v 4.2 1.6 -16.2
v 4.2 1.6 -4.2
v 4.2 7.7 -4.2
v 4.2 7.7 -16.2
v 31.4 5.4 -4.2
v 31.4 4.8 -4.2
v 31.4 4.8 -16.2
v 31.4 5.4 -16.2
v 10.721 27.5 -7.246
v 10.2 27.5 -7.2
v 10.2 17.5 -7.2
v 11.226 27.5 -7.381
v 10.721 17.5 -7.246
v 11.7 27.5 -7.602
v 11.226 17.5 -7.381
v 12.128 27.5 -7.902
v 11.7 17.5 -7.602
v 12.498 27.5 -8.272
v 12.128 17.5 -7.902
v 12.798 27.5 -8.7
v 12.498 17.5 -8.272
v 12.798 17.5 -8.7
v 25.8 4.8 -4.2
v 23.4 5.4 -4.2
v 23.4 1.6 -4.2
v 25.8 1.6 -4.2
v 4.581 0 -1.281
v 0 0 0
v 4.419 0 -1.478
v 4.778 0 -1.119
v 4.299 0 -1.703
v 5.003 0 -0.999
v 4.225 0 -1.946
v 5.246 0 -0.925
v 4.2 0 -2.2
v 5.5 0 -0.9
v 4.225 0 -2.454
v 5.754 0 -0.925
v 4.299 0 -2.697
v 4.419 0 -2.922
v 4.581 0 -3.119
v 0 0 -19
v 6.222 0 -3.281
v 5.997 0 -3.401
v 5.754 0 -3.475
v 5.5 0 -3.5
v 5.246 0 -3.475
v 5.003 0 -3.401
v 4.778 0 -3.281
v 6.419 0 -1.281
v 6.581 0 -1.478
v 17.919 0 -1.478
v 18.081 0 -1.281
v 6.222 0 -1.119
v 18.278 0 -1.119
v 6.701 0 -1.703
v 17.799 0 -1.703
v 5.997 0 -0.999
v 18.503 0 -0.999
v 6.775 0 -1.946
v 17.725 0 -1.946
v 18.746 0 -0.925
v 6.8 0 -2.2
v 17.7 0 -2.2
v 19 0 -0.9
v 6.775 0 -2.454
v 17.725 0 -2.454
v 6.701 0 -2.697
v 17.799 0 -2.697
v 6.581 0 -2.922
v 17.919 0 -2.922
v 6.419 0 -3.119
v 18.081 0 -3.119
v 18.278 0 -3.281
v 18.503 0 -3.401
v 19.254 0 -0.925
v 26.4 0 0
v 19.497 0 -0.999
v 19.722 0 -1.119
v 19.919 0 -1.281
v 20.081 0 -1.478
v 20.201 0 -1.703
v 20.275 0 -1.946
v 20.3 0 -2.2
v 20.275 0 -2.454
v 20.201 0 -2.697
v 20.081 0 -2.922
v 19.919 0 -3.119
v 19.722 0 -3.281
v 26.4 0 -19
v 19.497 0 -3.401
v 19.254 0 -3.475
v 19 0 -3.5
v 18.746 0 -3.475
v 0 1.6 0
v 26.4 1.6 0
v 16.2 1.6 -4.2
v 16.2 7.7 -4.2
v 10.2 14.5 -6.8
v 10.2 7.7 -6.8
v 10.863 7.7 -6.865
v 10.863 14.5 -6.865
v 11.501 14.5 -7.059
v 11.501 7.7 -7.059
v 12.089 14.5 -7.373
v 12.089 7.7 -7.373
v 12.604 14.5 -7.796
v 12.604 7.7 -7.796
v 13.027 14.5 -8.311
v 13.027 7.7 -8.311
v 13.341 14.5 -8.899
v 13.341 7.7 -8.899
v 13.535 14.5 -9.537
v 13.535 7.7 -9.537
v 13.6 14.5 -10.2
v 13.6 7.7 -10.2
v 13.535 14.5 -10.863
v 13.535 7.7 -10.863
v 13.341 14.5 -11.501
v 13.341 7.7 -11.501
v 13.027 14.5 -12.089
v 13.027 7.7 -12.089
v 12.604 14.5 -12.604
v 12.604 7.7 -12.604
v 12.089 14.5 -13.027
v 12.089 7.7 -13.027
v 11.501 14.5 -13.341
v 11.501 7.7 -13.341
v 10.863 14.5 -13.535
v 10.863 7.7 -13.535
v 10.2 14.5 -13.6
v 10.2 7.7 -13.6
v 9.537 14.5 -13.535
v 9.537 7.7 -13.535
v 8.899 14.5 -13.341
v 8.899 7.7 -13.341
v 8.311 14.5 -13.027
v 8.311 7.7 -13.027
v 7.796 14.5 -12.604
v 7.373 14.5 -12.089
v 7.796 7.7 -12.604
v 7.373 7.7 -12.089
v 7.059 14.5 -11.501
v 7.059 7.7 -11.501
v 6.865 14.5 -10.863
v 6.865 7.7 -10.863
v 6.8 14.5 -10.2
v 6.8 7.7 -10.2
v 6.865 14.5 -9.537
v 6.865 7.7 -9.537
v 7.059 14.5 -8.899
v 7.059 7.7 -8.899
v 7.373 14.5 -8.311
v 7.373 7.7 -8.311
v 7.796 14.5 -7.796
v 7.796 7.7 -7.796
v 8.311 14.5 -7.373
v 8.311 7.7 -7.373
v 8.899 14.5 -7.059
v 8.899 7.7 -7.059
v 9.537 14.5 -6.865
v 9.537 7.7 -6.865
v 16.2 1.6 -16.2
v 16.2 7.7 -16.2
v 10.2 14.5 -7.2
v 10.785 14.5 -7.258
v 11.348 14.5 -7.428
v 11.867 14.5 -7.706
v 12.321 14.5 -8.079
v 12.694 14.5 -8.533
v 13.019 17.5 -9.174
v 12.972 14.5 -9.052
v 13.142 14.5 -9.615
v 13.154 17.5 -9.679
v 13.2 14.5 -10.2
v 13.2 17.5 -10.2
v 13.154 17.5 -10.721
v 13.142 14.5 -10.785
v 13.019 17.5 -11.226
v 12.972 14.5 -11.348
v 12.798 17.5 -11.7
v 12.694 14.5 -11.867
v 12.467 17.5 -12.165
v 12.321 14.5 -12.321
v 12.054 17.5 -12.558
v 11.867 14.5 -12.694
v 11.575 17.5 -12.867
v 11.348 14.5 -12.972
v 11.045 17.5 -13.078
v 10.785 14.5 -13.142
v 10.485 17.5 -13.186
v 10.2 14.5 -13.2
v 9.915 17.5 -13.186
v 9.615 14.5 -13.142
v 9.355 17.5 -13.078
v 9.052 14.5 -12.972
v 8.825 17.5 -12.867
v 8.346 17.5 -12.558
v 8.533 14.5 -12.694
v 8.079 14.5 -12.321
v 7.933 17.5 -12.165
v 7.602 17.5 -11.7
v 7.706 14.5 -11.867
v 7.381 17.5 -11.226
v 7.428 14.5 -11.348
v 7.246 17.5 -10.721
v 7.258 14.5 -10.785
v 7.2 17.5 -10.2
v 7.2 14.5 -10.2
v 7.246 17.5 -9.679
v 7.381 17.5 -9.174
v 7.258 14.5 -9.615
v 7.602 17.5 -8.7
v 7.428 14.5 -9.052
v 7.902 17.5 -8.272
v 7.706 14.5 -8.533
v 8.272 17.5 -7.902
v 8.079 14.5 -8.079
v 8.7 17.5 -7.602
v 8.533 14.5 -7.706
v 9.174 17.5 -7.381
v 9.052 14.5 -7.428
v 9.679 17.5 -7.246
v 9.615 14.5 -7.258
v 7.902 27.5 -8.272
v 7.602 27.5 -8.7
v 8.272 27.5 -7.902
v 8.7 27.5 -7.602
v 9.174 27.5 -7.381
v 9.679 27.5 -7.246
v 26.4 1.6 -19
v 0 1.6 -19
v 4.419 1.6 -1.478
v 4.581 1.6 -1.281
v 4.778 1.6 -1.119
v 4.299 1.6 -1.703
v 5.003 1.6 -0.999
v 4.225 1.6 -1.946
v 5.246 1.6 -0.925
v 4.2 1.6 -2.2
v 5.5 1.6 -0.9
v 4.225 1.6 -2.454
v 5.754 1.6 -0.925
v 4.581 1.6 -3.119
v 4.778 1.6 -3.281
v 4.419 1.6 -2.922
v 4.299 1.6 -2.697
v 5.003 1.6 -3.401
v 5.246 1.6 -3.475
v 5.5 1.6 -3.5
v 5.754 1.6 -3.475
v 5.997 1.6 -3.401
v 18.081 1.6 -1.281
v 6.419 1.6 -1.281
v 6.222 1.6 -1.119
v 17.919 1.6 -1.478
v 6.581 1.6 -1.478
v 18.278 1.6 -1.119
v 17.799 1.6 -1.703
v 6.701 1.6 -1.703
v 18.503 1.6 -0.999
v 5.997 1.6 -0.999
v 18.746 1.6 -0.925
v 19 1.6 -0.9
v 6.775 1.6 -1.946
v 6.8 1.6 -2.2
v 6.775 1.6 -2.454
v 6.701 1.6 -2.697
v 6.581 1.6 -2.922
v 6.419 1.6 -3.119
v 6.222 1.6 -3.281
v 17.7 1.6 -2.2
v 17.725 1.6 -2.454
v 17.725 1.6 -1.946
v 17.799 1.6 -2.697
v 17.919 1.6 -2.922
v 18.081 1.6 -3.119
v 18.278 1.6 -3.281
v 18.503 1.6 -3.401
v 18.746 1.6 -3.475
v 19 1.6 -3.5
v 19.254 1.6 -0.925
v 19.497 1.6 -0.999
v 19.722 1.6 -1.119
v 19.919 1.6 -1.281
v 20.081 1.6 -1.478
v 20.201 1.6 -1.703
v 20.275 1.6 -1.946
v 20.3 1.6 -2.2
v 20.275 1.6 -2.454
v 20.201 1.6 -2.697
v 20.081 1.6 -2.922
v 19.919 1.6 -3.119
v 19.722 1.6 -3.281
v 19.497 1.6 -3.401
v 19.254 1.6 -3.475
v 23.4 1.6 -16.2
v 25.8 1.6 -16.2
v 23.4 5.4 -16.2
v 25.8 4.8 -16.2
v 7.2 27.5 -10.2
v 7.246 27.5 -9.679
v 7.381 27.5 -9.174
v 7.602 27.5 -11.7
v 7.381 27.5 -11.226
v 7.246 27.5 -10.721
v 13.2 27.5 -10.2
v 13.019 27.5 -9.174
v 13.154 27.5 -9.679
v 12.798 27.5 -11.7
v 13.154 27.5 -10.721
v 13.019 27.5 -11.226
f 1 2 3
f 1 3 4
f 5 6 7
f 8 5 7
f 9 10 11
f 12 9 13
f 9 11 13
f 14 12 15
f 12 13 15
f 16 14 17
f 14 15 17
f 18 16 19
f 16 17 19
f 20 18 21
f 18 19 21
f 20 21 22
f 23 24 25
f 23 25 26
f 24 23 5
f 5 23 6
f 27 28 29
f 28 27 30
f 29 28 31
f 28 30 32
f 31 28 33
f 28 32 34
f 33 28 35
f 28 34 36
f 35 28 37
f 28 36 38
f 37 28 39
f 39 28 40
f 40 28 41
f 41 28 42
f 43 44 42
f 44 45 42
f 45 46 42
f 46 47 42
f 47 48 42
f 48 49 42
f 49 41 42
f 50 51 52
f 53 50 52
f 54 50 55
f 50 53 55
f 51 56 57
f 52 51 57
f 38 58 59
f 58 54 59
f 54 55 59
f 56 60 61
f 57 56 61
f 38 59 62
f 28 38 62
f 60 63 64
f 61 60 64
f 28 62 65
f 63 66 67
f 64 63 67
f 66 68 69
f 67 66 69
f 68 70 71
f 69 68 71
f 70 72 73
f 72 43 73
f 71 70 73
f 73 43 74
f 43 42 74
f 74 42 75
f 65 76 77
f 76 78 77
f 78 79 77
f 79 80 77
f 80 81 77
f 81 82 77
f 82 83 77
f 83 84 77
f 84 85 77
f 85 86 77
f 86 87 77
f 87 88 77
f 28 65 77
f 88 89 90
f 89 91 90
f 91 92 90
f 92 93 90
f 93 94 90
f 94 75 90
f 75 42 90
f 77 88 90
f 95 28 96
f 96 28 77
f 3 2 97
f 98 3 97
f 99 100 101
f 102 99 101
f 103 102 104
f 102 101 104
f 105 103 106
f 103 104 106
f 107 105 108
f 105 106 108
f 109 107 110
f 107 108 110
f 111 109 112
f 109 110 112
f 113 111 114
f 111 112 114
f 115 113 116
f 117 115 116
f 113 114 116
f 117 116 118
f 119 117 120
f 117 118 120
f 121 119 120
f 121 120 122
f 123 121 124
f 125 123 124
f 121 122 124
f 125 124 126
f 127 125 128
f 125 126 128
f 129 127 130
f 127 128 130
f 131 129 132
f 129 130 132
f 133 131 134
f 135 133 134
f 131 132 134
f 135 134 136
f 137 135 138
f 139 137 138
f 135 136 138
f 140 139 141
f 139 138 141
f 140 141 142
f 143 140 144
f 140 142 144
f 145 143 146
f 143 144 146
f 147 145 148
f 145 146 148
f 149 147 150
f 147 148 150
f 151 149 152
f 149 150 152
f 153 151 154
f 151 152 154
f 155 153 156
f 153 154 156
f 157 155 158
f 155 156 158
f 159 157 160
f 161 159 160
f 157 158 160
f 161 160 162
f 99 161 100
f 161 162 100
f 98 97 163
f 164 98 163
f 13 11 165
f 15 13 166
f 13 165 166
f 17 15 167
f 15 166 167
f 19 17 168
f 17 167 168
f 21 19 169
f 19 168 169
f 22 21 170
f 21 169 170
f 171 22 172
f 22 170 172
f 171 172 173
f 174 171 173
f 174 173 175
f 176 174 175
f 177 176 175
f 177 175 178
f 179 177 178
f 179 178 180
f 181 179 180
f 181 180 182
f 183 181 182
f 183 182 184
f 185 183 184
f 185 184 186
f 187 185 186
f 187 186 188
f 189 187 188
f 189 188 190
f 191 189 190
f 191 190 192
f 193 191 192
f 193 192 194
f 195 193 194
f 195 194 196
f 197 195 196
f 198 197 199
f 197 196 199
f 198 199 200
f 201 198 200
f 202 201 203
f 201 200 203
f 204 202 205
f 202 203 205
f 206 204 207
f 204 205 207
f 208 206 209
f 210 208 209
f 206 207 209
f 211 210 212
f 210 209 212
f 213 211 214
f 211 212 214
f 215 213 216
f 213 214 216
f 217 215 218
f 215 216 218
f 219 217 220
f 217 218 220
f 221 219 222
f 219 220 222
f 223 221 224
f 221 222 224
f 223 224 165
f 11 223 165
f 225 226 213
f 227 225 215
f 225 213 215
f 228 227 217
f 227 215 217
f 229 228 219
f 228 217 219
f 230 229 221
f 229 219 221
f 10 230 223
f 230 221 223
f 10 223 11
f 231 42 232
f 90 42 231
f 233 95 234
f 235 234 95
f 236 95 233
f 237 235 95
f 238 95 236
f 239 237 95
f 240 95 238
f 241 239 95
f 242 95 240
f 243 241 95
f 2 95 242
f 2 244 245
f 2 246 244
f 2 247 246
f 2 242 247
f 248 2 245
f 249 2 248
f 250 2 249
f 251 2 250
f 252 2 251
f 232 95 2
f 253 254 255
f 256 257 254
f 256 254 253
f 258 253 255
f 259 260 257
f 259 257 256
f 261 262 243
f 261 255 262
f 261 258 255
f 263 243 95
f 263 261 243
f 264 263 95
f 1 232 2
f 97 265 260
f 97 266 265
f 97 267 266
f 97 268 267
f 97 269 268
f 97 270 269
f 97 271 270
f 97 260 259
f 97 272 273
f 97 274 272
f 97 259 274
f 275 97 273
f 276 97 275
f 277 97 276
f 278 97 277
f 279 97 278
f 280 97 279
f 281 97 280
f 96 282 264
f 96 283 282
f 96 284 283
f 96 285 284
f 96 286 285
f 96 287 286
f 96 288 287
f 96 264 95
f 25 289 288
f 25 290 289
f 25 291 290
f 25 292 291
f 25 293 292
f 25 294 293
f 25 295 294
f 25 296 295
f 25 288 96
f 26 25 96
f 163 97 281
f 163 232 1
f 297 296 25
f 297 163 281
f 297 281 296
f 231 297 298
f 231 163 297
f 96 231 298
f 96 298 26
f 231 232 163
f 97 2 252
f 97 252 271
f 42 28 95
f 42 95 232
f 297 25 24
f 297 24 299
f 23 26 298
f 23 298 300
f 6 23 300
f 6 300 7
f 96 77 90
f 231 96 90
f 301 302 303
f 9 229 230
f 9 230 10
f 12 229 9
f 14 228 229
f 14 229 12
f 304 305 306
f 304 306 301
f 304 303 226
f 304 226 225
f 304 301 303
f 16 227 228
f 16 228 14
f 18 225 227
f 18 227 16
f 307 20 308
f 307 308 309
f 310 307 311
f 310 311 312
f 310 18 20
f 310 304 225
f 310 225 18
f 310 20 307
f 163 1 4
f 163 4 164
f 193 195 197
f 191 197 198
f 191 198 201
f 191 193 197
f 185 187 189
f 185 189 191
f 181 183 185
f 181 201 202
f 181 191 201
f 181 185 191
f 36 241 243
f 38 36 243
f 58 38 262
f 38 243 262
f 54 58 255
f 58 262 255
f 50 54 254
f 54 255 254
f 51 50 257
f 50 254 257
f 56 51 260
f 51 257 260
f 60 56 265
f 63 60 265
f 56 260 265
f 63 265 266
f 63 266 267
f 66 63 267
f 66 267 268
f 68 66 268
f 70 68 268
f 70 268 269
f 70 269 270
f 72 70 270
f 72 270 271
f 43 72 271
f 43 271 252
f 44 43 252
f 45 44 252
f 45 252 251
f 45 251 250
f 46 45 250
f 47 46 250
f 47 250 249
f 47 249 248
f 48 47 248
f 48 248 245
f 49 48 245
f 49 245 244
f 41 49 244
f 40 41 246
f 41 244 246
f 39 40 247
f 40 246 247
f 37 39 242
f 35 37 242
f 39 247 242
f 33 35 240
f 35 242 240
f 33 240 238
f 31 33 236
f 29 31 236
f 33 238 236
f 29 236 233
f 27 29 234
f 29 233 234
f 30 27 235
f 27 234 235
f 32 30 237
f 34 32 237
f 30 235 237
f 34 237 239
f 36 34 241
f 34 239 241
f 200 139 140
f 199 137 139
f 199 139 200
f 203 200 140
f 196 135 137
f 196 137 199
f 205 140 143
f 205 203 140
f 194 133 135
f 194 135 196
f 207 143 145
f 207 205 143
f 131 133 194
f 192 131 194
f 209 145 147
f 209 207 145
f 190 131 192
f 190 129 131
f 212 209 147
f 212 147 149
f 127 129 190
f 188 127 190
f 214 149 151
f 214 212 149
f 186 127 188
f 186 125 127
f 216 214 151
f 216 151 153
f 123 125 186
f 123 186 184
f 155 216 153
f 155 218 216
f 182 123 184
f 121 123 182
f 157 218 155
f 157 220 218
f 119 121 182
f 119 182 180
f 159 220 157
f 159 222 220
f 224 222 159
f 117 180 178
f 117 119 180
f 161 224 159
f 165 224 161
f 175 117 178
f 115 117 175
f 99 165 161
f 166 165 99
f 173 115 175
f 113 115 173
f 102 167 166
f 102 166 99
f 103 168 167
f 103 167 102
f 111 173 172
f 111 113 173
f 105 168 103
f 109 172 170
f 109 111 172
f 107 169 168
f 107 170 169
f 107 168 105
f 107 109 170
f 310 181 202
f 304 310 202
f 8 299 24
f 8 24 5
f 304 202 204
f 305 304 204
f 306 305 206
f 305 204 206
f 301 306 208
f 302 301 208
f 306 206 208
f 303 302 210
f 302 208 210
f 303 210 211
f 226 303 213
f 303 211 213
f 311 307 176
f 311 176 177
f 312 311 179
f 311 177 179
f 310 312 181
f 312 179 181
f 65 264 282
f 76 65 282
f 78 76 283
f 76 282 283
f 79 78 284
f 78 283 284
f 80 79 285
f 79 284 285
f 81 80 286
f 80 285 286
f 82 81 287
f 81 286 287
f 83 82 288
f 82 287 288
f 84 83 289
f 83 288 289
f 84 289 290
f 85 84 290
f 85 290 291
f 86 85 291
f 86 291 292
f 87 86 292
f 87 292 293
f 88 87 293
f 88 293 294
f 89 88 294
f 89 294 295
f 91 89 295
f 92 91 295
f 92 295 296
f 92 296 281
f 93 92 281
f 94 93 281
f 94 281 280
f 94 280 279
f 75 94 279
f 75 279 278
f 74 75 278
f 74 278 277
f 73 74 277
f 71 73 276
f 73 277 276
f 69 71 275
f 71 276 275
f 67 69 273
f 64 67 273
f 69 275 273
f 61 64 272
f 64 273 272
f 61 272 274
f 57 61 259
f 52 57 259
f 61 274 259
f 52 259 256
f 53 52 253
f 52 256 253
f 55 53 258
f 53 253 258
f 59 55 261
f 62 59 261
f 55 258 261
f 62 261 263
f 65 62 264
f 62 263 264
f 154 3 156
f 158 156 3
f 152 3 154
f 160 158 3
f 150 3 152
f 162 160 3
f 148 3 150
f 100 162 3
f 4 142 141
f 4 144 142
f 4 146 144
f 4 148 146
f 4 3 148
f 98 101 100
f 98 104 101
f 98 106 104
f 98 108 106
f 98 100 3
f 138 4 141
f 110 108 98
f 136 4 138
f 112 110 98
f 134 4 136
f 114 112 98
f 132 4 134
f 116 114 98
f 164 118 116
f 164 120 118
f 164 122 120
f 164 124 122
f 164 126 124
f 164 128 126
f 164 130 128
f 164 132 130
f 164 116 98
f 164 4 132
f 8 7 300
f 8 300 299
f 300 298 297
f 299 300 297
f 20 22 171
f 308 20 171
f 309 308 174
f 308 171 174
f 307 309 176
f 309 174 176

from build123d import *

# Parameters (mm, degrees)
SKETCH2_W           = 26.4
SKETCH2_H           = 19
BOSS_EXTRUDE1_DEPTH = 1.6
SKETCH3_R           = 1.3
CUT_EXTRUDE1_DEPTH  = 33.56562605
SKETCH4_W           = 12
SKETCH4_H           = 12
BOSS_EXTRUDE2_DEPTH = 6.1
SKETCH5_R           = 3.4
BOSS_EXTRUDE3_DEPTH = 6.8
SKETCH6_R           = 3
BOSS_EXTRUDE4_DEPTH = 3
BOSS_EXTRUDE5_DEPTH = 10
SKETCH8_W           = 3
SKETCH8_H           = 12
SKETCH8_W_2         = 5
BOSS_EXTRUDE6_DEPTH = 3.8
SKETCH9_W           = 5.6
SKETCH9_H           = 3.2
CUT_EXTRUDE2_DEPTH  = 45.286002303


with BuildPart() as part:
    # Sketch2 → Boss-Extrude1 (new body)
    with BuildSketch(Plane(origin=(0, 0, 0), x_dir=(1, 0, 0), z_dir=(0, 1, 0))):
        with Locations((13.2, 9.5)):
            Rectangle(SKETCH2_W, SKETCH2_H)
    extrude(amount=BOSS_EXTRUDE1_DEPTH)

    # Sketch3 → Cut-Extrude1 (cut, through all)
    with BuildSketch(Plane(origin=(0, 1.6, 0), x_dir=(1, 0, 0), z_dir=(0, 1, 0))):
        with Locations(Location((5.5, 2.2, 0), (0, 0, 270))):
            Circle(SKETCH3_R)
        with Locations(Location((19, 2.2, 0), (0, 0, 270))):
            Circle(SKETCH3_R)
    extrude(amount=-CUT_EXTRUDE1_DEPTH, mode=Mode.SUBTRACT)

    # Sketch4 → Boss-Extrude2 (add)
    with BuildSketch(Plane(origin=(0, 1.6, 0), x_dir=(1, 0, 0), z_dir=(0, 1, 0))):
        with Locations((10.2, 10.2)):
            Rectangle(SKETCH4_W, SKETCH4_H)
    extrude(amount=BOSS_EXTRUDE2_DEPTH)

    # Sketch5 → Boss-Extrude3 (add)
    with BuildSketch(Plane(origin=(0, 7.7, 0), x_dir=(1, 0, 0), z_dir=(0, 1, 0))):
        with Locations(Location((10.2, 10.2, 0), (0, 0, 270))):
            Circle(SKETCH5_R)
    extrude(amount=BOSS_EXTRUDE3_DEPTH)

    # Sketch6 → Boss-Extrude4 (add)
    with BuildSketch(Plane(origin=(0, 14.5, 0), x_dir=(1, 0, 0), z_dir=(0, 1, 0))):
        with Locations(Location((10.2, 10.2, 0), (0, 0, 270))):
            Circle(SKETCH6_R)
    extrude(amount=BOSS_EXTRUDE4_DEPTH)

    # Sketch7 → Boss-Extrude5 (add)
    with BuildSketch(Plane(origin=(0, 17.5, 0), x_dir=(1, 0, 0), z_dir=(0, 1, 0))):
        with BuildLine():
            ThreePointArc((13.2, 10.2), (13.097777479, 10.976457135), (12.798076211, 11.7))
            Line((12.798076211, 11.7), (12.798076211, 8.7))
            ThreePointArc((12.798076211, 8.7), (13.097777479, 9.423542865), (13.2, 10.2))
        make_face()
        with BuildLine():
            Line((7.601923789, 8.7), (7.601923789, 11.7))
            ThreePointArc((7.601923789, 11.7), (7.2, 10.2), (7.601923789, 8.7))
        make_face()
        with BuildLine():
            Line((12.798076211, 11.7), (7.601923789, 11.7))
            Line((7.601923789, 11.7), (7.601923789, 8.7))
            ThreePointArc((7.601923789, 8.7), (8.7, 7.601923789), (10.2, 7.2))
            ThreePointArc((10.2, 7.2), (11.7, 7.601923789), (12.798076211, 8.7))
            Line((12.798076211, 8.7), (12.798076211, 11.7))
        make_face()
    extrude(amount=BOSS_EXTRUDE5_DEPTH)

    # Sketch8 → Boss-Extrude6 (add)
    with BuildSketch(Plane(origin=(0, 1.6, 0), x_dir=(1, 0, 0), z_dir=(0, 1, 0))):
        with Locations((24.9, 10.2)):
            Rectangle(SKETCH8_W, SKETCH8_H)
        with Locations((28.9, 10.2)):
            Rectangle(SKETCH8_W_2, SKETCH8_H)
    extrude(amount=BOSS_EXTRUDE6_DEPTH)

    # Sketch9 → Cut-Extrude2 (cut, through all)
    with BuildSketch(Plane.XY.offset(-4.2)):
        with Locations((28.6, 3.2)):
            Rectangle(SKETCH9_W, SKETCH9_H)
    extrude(amount=-CUT_EXTRUDE2_DEPTH, mode=Mode.SUBTRACT)


solid = part.part
